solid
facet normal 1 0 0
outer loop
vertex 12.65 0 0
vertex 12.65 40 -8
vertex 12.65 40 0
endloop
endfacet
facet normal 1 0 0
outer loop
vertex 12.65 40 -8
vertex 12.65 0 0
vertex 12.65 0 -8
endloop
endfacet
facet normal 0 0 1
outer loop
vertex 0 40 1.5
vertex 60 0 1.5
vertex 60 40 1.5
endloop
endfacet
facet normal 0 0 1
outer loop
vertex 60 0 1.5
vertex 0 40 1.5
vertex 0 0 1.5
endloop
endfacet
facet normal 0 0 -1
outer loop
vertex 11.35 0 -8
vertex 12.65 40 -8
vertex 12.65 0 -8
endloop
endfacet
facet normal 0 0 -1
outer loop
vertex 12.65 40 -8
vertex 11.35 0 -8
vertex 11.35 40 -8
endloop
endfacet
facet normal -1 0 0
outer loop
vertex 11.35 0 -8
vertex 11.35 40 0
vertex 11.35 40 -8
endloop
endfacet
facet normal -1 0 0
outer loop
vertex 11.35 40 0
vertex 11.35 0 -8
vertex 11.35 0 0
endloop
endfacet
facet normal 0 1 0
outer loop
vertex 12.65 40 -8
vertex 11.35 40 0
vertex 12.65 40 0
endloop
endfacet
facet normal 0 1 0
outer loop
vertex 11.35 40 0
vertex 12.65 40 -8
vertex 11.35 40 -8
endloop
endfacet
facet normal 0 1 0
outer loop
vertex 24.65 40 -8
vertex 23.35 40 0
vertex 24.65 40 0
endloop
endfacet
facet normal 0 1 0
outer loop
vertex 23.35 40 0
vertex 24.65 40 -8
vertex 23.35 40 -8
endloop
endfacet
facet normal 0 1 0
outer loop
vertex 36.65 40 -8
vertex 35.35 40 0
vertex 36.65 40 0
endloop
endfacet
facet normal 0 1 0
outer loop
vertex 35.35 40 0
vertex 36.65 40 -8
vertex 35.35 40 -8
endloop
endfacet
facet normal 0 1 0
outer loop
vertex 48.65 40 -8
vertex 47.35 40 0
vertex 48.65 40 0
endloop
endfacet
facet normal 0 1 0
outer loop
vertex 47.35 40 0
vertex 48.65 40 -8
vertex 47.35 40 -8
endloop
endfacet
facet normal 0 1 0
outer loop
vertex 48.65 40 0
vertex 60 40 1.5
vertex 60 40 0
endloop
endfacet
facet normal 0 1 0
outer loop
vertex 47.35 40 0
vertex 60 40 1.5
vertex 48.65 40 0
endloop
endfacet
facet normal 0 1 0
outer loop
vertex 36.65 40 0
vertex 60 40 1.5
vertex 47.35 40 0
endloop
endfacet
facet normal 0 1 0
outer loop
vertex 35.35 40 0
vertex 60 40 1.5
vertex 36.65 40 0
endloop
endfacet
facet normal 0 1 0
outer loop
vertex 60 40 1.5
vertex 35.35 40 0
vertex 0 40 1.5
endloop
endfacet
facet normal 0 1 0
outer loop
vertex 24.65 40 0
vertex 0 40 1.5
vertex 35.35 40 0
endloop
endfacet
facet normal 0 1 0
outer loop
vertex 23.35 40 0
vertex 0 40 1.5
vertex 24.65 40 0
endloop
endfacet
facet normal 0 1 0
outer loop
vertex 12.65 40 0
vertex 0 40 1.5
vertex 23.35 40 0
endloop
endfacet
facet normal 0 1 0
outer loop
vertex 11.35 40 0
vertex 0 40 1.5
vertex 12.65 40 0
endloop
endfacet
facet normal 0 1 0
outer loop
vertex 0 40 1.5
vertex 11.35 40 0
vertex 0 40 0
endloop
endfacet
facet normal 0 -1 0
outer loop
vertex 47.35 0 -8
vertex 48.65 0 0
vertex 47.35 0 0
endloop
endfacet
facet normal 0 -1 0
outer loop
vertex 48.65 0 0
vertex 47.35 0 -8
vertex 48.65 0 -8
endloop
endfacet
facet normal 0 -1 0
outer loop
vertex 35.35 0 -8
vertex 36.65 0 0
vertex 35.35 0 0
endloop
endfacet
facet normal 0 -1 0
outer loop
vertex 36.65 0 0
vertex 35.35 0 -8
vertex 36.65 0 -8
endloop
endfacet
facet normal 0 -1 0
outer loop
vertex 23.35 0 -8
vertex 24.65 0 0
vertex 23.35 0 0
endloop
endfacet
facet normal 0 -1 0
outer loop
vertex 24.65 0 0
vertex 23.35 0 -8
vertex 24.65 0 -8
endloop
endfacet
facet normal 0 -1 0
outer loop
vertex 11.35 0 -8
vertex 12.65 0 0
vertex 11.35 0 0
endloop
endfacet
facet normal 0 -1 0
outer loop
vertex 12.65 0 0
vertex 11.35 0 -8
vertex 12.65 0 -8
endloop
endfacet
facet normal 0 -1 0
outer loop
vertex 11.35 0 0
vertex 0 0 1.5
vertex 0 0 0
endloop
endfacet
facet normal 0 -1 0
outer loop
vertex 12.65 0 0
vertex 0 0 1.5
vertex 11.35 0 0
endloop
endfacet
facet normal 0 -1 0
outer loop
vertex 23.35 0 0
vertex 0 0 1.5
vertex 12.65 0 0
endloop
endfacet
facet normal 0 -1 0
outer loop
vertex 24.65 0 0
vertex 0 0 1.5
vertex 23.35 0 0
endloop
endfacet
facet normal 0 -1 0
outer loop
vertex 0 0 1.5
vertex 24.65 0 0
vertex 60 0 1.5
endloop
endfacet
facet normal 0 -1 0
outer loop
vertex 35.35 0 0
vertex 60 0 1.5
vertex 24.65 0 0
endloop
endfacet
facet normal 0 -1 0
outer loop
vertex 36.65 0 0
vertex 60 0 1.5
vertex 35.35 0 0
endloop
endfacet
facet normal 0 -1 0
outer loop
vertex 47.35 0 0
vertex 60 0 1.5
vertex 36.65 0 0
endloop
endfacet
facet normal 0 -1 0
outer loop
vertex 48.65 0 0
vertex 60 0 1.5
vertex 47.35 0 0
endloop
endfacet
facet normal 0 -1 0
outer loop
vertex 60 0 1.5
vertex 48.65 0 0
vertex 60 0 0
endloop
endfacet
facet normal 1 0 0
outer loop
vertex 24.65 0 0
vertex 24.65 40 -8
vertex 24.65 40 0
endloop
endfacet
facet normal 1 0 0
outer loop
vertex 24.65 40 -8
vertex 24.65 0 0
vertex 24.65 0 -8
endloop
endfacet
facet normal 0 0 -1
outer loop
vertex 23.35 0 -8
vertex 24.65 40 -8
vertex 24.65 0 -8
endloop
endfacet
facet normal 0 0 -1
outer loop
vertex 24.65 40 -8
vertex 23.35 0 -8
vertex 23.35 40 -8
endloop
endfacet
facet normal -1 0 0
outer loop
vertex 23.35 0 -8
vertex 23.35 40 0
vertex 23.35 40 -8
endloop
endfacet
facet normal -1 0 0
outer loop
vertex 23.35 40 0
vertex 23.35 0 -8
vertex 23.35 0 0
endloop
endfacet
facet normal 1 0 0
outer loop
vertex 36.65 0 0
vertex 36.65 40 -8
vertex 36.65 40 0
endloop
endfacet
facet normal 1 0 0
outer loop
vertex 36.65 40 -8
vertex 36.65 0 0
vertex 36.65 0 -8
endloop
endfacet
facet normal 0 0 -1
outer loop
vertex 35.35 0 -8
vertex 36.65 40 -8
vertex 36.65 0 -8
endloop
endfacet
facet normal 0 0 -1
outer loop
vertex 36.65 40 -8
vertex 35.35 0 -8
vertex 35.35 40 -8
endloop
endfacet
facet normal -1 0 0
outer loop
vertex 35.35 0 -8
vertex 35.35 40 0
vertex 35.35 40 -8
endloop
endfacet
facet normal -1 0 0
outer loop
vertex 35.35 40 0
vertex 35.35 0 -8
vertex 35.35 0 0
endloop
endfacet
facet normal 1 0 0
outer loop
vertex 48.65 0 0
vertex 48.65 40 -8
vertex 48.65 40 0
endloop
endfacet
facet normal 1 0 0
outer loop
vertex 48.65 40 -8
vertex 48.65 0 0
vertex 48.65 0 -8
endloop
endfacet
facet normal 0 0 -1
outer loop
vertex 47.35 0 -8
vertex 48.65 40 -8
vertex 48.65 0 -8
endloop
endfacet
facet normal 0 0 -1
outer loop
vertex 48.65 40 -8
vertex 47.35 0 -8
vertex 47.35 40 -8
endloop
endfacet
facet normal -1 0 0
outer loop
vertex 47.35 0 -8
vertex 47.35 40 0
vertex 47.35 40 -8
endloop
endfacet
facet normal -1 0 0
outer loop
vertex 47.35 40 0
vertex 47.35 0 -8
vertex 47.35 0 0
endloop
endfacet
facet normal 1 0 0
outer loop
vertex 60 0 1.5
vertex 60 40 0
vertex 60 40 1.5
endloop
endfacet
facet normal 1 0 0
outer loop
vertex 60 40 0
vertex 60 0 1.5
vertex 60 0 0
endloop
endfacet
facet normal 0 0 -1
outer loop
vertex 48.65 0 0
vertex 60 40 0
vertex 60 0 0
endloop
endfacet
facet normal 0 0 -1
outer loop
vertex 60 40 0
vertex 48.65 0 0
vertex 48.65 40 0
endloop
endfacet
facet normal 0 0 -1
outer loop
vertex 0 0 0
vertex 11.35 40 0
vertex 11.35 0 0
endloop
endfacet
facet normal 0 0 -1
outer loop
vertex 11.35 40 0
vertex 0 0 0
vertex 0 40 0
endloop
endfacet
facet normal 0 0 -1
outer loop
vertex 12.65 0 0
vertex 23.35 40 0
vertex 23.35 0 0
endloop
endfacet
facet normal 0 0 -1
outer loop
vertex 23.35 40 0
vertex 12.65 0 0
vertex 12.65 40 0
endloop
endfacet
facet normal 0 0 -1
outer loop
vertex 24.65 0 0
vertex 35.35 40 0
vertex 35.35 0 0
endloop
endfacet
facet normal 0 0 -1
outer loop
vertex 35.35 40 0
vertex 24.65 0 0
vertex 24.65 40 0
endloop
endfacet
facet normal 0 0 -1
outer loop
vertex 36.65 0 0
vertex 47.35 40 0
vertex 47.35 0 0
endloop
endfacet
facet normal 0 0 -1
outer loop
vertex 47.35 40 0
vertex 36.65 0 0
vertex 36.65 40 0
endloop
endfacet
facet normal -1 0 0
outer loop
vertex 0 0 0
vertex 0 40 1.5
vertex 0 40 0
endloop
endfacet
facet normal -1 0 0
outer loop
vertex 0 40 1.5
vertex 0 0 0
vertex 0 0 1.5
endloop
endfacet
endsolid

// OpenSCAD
$fn = 32;

// ----------------------------------------------------------------------
// Ribbed panel: 1.5 mm panel
// ----------------------------------------------------------------------

// --- parameters (mm) ---
panel_l = 60;             // panel length, X
panel_w = 40;             // panel width, Y
panel_t = 1.5;            // panel thickness, Z
rib_t = 1.3;              // rib thickness
rib_h = 8;                // rib height below the panel
ribs = 4;                 // number of ribs

total_h = panel_t + rib_h;  // overall height

union() {
  cube([panel_l, panel_w, panel_t]);
  for (i = [1 : ribs])
    translate([i * panel_l / (ribs + 1) - rib_t / 2, 0, -rib_h])
      cube([rib_t, panel_w, rib_h + panel_t]);
}
